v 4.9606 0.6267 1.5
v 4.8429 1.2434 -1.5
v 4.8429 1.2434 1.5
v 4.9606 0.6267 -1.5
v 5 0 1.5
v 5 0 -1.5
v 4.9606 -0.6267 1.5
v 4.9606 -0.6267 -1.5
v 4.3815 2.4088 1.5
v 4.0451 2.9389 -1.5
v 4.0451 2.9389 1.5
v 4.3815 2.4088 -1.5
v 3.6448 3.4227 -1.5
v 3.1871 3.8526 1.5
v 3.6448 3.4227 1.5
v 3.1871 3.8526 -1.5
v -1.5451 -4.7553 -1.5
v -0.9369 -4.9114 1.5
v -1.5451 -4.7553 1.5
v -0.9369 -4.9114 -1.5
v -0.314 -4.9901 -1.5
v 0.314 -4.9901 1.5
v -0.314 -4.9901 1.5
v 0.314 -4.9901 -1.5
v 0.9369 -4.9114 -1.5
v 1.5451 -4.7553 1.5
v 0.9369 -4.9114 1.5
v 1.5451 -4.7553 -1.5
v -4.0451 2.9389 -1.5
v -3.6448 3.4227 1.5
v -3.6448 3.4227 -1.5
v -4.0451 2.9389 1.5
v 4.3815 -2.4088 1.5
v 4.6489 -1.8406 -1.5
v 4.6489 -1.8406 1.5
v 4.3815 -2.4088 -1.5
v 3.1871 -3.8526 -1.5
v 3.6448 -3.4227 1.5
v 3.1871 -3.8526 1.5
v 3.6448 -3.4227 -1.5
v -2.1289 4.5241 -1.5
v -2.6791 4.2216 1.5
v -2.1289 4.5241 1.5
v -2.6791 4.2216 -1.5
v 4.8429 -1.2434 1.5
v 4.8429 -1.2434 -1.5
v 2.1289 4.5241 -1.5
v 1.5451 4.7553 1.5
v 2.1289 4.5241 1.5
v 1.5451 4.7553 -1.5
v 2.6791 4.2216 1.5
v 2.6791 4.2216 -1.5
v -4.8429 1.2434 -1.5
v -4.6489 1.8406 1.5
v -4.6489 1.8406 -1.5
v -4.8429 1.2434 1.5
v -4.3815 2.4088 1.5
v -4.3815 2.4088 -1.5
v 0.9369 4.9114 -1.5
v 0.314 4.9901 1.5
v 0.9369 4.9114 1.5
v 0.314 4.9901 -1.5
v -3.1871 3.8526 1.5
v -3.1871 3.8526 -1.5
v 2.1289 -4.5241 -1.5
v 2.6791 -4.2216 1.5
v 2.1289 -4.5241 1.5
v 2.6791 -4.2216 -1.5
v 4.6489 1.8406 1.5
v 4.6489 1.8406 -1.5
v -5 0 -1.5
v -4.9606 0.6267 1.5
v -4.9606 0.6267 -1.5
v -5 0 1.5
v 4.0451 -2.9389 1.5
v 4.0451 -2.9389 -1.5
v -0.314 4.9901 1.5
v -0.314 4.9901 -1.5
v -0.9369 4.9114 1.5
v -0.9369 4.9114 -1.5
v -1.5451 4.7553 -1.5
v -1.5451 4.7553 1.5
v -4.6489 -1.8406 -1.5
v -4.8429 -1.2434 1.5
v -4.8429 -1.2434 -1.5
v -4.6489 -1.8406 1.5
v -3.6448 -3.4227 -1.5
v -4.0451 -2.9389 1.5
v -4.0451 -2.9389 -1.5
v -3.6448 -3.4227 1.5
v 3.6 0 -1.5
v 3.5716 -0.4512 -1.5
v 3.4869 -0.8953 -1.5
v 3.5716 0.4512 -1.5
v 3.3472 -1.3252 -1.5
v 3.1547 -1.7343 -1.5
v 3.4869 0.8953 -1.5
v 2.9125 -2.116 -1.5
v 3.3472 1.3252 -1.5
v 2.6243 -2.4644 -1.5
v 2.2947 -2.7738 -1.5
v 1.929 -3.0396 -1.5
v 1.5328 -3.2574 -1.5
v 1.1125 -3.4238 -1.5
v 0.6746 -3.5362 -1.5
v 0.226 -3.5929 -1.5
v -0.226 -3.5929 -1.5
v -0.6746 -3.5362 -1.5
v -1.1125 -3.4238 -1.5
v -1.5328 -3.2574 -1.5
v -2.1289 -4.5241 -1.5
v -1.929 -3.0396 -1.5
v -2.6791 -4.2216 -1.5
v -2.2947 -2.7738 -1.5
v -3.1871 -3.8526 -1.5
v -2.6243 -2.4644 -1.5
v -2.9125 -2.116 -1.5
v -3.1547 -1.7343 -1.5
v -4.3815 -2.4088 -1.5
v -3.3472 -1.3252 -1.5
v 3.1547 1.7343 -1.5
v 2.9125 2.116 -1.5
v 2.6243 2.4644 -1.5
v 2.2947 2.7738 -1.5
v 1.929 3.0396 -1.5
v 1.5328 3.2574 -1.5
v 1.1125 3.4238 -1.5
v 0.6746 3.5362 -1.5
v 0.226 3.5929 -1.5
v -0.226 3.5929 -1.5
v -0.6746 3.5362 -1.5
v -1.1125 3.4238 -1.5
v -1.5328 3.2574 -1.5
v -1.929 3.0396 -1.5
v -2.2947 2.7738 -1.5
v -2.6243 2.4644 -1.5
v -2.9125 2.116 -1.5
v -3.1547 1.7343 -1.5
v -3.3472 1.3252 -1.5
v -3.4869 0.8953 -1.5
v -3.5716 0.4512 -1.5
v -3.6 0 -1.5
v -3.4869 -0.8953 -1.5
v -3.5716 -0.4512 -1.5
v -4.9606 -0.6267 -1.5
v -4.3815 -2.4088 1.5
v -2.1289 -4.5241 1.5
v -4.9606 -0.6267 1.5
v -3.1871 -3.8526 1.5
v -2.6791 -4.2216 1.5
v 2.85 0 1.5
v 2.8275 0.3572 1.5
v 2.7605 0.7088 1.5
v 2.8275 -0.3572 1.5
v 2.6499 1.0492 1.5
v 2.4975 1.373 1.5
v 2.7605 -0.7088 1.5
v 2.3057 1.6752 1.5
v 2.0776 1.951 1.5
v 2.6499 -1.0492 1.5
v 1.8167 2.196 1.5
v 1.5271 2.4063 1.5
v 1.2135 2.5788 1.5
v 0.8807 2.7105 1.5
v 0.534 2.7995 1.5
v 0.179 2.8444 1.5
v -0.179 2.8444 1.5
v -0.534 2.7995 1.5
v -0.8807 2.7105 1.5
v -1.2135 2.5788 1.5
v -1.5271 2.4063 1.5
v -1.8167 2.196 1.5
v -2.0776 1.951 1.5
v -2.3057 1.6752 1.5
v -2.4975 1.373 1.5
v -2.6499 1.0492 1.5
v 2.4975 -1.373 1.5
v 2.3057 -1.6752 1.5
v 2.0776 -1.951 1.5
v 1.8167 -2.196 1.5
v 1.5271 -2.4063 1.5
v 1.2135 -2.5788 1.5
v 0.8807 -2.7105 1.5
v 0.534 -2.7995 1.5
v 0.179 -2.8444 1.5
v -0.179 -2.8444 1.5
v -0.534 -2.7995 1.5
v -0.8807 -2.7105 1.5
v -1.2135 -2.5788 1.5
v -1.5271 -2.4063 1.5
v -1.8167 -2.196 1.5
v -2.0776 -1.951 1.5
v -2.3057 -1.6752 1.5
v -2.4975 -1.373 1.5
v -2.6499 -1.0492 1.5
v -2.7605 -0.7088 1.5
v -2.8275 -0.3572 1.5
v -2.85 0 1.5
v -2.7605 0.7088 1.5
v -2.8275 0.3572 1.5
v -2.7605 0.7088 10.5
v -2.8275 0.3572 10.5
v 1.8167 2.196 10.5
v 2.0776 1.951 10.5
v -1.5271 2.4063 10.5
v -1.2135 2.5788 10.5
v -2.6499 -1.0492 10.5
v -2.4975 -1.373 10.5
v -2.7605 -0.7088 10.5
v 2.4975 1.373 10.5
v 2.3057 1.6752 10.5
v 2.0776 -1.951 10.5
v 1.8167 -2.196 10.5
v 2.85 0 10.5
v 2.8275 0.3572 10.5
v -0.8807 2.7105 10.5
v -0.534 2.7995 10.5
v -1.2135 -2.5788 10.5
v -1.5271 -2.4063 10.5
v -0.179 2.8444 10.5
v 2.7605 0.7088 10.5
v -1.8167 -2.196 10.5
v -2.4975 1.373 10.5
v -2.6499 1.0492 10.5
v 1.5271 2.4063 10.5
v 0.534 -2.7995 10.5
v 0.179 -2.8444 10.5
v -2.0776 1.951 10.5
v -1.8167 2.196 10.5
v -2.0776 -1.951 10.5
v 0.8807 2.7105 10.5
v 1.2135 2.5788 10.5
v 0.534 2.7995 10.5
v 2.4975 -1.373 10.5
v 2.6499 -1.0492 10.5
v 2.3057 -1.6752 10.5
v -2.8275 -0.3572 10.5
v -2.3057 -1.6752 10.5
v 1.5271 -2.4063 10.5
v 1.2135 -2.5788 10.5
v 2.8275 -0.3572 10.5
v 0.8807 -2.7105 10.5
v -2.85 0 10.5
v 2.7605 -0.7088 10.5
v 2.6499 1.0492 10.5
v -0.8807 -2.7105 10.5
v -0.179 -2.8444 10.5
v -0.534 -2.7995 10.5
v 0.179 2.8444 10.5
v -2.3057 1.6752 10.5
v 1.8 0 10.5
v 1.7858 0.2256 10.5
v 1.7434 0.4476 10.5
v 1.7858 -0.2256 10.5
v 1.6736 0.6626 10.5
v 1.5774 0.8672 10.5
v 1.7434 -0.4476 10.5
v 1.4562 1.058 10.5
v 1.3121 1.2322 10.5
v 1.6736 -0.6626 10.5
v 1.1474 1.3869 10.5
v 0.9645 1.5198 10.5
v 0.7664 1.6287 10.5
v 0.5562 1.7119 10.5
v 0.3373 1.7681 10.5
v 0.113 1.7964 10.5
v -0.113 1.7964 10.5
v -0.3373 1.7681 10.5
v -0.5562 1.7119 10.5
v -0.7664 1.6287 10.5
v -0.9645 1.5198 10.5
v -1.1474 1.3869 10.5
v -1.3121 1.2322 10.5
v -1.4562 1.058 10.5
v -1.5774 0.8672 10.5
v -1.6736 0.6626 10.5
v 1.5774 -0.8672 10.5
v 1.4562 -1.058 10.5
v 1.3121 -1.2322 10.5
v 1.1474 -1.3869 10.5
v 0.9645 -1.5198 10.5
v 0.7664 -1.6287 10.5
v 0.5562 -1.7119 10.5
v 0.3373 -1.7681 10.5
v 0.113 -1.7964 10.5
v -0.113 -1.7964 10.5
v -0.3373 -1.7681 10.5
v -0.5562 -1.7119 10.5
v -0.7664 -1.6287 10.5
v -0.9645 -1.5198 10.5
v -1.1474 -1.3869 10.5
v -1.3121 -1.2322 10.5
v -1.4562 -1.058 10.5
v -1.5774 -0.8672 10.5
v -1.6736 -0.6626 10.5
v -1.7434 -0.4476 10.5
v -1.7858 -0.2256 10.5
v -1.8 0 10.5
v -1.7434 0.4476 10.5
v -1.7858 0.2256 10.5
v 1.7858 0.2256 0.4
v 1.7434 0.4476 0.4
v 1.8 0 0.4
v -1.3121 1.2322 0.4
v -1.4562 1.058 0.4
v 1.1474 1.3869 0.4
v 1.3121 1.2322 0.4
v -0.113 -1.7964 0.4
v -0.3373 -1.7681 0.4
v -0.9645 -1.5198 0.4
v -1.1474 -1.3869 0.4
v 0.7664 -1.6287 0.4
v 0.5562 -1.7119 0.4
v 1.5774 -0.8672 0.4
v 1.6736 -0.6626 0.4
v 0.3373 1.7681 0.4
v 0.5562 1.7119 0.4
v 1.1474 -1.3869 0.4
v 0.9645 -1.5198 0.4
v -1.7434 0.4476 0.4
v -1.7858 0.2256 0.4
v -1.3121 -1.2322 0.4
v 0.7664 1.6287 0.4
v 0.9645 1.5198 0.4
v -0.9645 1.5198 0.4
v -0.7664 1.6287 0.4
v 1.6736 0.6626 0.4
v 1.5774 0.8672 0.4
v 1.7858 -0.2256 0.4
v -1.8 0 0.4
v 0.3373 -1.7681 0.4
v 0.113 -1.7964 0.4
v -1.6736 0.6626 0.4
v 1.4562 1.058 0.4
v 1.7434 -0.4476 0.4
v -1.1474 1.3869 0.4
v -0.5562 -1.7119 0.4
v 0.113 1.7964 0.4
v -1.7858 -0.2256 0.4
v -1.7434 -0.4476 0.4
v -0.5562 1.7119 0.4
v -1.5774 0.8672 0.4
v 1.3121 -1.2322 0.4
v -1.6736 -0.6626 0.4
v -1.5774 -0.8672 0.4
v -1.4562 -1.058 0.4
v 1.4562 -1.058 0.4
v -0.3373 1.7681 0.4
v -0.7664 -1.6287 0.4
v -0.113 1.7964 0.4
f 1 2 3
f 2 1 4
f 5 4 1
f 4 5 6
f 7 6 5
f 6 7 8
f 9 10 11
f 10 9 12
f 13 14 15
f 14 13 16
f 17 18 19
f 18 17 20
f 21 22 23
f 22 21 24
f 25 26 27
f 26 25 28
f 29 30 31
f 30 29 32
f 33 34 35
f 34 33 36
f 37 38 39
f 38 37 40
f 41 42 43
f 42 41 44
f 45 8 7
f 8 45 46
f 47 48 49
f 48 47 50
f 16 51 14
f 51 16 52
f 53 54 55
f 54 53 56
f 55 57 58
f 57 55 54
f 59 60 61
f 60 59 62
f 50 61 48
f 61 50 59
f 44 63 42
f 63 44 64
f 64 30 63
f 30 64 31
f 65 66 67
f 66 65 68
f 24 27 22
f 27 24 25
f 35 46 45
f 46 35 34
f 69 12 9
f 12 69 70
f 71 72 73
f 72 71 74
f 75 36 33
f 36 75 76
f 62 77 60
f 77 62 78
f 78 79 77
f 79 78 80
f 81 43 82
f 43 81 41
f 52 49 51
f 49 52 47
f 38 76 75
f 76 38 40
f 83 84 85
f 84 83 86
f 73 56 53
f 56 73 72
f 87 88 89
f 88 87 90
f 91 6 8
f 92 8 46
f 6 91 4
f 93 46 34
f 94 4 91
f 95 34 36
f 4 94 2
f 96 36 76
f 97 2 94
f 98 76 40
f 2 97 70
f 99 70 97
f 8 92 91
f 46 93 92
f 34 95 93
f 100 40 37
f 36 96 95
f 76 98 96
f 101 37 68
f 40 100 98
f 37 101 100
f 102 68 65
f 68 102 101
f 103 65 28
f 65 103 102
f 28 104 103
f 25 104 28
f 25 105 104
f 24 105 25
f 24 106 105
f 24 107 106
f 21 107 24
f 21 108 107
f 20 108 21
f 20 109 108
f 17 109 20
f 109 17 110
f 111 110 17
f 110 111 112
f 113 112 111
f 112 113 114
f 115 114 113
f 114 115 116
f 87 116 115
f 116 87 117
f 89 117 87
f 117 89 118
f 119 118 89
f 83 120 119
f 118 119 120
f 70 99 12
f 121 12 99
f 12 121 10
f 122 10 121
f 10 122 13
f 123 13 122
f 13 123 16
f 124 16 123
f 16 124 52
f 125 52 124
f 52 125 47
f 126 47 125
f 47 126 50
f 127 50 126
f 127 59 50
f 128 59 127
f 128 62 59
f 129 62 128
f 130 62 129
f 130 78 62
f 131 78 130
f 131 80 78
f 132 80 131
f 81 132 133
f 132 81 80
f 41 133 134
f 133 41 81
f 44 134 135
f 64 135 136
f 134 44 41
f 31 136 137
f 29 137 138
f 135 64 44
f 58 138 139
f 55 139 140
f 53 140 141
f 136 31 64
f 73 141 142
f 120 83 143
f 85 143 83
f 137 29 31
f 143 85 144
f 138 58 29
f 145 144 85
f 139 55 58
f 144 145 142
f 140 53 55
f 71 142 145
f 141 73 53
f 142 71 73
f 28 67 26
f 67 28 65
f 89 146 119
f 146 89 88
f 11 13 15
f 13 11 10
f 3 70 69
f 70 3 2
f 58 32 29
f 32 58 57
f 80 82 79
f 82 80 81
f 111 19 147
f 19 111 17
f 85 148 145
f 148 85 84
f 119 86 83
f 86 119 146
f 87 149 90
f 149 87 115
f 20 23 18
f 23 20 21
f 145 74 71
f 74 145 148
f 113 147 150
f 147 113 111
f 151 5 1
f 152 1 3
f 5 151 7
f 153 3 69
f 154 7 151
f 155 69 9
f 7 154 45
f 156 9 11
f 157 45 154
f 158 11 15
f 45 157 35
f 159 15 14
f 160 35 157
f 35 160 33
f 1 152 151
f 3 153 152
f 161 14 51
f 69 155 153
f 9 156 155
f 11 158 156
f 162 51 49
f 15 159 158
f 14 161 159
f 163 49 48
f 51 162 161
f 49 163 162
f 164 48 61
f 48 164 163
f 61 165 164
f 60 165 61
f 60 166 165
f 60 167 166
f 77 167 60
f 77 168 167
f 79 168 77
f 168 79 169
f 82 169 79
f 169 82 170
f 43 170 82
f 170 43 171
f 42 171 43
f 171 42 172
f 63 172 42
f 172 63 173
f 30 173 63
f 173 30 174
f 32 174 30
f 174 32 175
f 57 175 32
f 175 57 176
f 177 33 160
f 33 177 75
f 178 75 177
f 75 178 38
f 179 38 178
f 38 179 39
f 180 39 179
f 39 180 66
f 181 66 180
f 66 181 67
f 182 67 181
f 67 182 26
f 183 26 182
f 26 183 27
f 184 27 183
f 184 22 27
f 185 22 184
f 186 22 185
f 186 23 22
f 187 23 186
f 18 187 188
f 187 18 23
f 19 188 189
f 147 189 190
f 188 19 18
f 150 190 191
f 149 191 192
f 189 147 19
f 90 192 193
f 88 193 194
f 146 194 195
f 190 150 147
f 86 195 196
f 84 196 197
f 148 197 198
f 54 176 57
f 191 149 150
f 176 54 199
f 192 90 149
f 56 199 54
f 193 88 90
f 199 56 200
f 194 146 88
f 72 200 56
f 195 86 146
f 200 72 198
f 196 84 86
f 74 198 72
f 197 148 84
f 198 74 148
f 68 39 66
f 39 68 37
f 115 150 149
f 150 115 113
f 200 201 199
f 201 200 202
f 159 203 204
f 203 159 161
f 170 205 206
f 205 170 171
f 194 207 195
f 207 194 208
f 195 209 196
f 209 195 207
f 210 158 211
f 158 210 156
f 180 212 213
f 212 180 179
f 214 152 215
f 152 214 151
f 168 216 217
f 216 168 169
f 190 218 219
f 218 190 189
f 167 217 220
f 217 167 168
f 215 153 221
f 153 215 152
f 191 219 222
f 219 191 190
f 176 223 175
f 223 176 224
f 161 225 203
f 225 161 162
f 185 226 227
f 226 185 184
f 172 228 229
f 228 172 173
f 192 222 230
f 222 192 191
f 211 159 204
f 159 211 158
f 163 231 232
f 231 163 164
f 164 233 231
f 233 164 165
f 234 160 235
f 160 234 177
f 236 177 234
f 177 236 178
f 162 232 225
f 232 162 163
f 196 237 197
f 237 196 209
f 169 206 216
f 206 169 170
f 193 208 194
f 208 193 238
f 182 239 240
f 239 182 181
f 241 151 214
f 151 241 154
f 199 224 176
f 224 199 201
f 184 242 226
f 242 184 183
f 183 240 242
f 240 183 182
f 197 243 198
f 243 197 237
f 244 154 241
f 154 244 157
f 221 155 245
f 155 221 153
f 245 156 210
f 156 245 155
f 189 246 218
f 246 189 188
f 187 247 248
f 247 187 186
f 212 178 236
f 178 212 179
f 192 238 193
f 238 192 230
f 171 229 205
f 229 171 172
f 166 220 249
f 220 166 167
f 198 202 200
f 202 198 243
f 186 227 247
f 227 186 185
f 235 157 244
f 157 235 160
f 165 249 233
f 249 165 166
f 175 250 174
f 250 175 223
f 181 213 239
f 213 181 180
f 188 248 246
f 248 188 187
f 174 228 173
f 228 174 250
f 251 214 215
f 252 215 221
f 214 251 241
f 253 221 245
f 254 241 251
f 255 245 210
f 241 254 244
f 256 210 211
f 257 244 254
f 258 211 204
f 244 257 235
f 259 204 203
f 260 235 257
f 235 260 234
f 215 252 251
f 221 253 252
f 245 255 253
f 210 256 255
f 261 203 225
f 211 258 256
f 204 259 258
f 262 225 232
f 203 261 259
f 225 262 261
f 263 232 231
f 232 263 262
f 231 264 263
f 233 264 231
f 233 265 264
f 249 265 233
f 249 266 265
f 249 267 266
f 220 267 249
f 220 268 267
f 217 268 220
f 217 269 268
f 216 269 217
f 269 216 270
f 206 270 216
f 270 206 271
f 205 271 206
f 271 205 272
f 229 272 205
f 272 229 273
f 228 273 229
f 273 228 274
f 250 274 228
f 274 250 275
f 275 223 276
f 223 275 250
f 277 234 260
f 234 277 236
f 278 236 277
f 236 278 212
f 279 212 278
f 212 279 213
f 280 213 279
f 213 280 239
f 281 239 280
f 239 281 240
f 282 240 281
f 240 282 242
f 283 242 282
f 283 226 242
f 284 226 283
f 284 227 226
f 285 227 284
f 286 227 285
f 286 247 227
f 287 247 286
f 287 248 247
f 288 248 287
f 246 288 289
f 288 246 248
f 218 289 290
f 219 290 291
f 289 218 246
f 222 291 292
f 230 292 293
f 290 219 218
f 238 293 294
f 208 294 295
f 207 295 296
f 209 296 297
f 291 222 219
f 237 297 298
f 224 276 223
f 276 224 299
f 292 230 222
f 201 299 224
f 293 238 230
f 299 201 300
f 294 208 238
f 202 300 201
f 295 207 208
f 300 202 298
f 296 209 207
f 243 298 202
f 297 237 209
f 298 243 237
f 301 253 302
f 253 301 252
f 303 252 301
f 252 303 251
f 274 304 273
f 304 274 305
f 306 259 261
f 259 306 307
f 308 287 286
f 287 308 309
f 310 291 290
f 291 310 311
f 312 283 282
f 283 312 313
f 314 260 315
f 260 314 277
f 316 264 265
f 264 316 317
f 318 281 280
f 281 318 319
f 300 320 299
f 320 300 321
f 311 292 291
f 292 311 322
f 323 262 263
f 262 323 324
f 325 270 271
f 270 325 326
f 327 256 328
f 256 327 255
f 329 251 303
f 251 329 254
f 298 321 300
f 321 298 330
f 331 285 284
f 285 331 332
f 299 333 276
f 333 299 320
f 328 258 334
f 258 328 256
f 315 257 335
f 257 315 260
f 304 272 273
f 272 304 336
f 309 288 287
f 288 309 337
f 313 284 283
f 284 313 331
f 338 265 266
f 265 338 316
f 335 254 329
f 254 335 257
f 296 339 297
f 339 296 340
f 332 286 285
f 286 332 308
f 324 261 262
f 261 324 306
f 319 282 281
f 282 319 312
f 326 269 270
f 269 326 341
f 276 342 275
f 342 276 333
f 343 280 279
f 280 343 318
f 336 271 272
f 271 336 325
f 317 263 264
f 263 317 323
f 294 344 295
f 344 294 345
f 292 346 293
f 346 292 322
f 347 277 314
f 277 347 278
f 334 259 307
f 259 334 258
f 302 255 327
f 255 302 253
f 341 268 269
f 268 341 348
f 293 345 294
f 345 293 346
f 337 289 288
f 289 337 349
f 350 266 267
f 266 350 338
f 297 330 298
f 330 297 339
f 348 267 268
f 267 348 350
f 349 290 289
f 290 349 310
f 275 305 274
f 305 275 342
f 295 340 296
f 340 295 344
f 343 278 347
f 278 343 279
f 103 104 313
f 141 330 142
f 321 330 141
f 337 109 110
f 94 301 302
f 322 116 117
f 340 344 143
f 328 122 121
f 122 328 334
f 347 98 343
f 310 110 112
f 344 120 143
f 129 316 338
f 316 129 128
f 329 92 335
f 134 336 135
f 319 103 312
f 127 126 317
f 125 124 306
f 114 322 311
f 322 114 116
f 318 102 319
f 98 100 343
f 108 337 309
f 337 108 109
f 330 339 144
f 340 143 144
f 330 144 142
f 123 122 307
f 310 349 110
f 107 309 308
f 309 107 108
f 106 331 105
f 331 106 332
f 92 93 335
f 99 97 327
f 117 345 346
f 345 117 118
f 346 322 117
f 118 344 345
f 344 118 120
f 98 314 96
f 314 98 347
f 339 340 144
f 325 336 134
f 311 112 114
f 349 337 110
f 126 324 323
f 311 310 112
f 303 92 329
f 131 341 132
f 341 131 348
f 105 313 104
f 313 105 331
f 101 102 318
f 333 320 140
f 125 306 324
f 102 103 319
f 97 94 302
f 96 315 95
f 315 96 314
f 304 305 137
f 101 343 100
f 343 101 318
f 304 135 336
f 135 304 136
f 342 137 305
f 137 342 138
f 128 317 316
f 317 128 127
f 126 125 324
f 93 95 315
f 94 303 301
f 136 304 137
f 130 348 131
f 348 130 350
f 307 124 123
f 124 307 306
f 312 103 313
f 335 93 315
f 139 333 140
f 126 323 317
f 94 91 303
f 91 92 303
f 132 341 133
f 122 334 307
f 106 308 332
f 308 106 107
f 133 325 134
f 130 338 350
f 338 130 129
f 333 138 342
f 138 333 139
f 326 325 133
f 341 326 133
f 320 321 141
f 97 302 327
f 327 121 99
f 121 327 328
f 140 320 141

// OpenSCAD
$fn = 50;


difference() {
	union() {
		translate(v = [0, 0, -1.5000000000]) {
			rotate(a = [0, 0, 0]) {
				cylinder(h = 3, r = 5.0000000000);
			}
		}
		translate(v = [0, 0, -1.5000000000]) {
			rotate(a = [0, 0, 0]) {
				cylinder(h = 12, r = 2.8500000000);
			}
		}
	}
	union() {
		translate(v = [0, 0, -125.0000000000]) {
			rotate(a = [0, 0, 0]) {
				cylinder(h = 250, r = 1.8000000000);
			}
		}
		#translate(v = [0, 0, 0.4000000000]) {
			rotate(a = [0, 180, 0]) {
				cylinder(h = 1.9000000000, r1 = 1.8000000000, r2 = 3.6000000000);
			}
		}
		#translate(v = [0, 0, 10.5000000000]) {
			rotate(a = [0, 180, 0]) {
				cylinder(h = 12, r = 1.8000000000);
			}
		}
	}
}
